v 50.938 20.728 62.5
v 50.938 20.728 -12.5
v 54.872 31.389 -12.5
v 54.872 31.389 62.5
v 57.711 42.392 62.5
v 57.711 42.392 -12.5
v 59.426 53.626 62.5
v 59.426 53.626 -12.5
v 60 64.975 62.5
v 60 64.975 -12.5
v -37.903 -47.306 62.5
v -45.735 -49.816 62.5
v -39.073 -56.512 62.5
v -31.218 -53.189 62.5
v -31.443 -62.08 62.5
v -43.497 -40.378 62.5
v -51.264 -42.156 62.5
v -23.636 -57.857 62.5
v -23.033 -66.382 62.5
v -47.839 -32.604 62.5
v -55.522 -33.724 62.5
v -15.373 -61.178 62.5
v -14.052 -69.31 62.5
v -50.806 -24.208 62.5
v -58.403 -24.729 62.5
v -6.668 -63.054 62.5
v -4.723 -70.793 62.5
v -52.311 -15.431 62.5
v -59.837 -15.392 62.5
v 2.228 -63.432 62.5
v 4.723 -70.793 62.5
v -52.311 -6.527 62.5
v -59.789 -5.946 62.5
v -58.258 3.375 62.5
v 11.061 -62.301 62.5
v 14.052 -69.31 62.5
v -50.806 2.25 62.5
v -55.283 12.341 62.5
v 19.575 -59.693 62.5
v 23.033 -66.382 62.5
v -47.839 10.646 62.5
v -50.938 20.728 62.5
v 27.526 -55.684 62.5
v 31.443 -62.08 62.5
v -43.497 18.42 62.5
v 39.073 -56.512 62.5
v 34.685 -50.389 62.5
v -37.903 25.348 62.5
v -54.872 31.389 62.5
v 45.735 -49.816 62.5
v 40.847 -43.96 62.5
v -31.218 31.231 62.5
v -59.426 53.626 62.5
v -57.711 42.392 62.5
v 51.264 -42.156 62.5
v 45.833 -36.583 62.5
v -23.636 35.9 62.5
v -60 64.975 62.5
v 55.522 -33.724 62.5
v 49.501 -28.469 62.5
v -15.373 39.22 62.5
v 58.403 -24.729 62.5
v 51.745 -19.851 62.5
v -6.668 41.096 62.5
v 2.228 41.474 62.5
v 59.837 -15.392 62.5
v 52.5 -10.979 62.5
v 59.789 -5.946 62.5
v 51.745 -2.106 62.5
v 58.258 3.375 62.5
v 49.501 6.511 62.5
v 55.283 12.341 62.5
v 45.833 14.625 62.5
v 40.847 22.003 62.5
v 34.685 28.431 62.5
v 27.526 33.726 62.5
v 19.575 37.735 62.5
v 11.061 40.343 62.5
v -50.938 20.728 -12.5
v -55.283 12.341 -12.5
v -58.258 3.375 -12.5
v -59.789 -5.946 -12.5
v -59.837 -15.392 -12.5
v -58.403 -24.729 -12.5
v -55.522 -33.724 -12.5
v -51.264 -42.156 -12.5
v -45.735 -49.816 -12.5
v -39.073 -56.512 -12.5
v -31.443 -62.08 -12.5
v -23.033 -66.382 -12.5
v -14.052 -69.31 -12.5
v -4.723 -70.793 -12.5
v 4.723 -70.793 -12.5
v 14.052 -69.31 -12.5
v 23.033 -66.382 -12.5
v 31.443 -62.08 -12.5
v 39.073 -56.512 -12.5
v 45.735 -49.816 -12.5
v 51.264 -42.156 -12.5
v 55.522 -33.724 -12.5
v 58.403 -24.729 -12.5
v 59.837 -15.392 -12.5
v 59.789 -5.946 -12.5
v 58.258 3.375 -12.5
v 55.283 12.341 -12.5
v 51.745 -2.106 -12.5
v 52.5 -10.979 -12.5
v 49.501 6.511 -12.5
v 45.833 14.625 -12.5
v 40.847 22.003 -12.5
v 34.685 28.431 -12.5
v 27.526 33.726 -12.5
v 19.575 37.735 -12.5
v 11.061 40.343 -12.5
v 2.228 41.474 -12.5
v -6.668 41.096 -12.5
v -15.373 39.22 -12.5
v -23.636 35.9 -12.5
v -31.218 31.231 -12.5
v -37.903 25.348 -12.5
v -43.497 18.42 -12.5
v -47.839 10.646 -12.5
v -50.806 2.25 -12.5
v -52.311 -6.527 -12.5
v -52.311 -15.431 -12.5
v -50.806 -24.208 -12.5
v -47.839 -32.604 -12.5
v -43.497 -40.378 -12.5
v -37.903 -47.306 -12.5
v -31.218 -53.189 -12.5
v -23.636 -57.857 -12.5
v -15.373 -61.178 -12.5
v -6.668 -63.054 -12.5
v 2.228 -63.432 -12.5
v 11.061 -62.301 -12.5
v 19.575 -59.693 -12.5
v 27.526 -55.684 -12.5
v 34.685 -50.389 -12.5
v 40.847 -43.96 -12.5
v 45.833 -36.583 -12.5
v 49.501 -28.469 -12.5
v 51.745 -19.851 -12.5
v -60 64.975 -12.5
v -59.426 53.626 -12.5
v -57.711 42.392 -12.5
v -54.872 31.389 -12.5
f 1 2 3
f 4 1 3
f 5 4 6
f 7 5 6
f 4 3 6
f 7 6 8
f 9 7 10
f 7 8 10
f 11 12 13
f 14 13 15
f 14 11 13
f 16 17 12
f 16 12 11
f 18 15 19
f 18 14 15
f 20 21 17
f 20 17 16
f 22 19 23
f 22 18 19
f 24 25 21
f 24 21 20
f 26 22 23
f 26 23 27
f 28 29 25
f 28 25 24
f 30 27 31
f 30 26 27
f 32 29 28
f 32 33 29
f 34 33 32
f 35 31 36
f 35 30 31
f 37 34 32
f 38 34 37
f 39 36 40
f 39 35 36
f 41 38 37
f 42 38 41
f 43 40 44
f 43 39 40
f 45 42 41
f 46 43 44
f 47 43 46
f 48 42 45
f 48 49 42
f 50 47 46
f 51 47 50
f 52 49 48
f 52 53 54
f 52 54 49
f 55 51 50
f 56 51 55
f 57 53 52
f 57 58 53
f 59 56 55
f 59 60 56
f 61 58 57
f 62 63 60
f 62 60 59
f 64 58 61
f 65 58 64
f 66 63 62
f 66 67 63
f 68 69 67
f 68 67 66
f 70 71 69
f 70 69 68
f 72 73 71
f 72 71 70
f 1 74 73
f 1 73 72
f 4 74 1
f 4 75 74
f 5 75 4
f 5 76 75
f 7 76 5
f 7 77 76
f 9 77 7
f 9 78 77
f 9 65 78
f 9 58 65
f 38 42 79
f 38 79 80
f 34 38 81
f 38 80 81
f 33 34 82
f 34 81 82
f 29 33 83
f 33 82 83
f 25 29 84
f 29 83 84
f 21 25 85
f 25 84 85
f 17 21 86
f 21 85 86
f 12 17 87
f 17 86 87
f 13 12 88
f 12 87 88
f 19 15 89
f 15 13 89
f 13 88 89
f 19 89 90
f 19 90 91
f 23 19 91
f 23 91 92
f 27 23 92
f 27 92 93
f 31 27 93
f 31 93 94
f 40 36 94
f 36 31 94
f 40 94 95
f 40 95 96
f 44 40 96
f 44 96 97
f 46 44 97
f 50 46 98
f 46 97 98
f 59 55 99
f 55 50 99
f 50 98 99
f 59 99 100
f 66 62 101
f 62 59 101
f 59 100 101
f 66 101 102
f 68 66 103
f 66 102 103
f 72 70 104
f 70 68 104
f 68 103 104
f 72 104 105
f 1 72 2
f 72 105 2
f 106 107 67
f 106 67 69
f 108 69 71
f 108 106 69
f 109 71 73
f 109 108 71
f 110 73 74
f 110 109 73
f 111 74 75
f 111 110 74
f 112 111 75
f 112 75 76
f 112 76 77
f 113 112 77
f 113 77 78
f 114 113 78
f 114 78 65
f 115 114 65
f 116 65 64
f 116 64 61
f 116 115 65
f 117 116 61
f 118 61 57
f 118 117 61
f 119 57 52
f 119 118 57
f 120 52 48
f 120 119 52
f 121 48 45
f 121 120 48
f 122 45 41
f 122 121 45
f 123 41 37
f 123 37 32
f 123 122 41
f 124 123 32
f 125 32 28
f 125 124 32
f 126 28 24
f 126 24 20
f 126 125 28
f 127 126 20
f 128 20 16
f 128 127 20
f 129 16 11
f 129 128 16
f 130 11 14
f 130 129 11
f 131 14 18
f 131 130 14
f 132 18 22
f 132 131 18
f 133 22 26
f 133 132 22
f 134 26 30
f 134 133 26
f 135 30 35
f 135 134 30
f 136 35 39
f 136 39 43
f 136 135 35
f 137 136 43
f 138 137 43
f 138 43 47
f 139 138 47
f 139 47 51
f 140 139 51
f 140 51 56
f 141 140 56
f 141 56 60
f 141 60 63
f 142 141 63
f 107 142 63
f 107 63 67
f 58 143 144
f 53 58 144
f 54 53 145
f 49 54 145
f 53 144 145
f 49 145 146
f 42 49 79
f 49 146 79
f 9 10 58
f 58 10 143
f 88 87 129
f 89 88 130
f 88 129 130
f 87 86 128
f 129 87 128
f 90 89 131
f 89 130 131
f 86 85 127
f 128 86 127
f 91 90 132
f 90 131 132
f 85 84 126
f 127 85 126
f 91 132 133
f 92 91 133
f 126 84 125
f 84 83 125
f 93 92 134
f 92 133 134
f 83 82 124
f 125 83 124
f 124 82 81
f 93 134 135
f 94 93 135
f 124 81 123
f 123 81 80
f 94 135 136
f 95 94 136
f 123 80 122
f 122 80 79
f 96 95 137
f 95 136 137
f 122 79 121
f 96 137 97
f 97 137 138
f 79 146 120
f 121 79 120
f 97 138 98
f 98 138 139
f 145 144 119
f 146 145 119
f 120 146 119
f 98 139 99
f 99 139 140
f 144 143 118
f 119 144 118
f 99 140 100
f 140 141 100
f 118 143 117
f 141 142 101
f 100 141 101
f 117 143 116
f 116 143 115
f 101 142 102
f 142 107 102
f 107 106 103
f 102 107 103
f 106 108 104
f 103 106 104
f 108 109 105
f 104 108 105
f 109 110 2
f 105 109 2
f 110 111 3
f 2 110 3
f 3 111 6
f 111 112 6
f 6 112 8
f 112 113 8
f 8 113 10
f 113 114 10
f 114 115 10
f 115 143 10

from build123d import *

# Parameters (mm, degrees)
SKETCH1_R           = 40
SKETCH1_R_2         = 35
BOSS_EXTRUDE1_DEPTH = 50
BOSS_EXTRUDE2_START = -50
BOSS_EXTRUDE2_DEPTH = 50
SCALE1_SCALE        = 1.5


with BuildPart() as part:
    # Sketch1 → Boss-Extrude1 (new body)
    with BuildSketch(Plane.XY):
        Circle(SKETCH1_R)
        Circle(SKETCH1_R_2, mode=Mode.SUBTRACT)
    extrude(amount=BOSS_EXTRUDE1_DEPTH)

    # Sketch2 → Boss-Extrude2 (add)
    with BuildSketch(Plane.XY.offset(50).offset(BOSS_EXTRUDE2_START)):
        with BuildLine():
            Line((0, 40), (0, 50.63587493))
            Line((0, 50.63587493), (-40, 50.63587493))
            ThreePointArc((-40, 50.63587493), (-38.47413578, 35.580764102), (-33.958601629, 21.137960531))
            ThreePointArc((-33.958601629, 21.137960531), (-19.422687491, 34.967974071), (0, 40))
        make_face()
        with BuildLine():
            ThreePointArc((33.958601629, 21.137960531), (38.47413578, 35.580764102), (40, 50.63587493))
            Line((40, 50.63587493), (0, 50.63587493))
            Line((0, 50.63587493), (0, 40))
            ThreePointArc((0, 40), (19.422687491, 34.967974071), (33.958601629, 21.137960531))
        make_face()
    extrude(amount=BOSS_EXTRUDE2_DEPTH)


with BuildPart() as part_1:
    # Scale1: scaled about (0, 21.957707066, 25)
    add(part.part.scale(SCALE1_SCALE).moved(Location((0, -10.978853533, -12.5))))


solid = part_1.part
